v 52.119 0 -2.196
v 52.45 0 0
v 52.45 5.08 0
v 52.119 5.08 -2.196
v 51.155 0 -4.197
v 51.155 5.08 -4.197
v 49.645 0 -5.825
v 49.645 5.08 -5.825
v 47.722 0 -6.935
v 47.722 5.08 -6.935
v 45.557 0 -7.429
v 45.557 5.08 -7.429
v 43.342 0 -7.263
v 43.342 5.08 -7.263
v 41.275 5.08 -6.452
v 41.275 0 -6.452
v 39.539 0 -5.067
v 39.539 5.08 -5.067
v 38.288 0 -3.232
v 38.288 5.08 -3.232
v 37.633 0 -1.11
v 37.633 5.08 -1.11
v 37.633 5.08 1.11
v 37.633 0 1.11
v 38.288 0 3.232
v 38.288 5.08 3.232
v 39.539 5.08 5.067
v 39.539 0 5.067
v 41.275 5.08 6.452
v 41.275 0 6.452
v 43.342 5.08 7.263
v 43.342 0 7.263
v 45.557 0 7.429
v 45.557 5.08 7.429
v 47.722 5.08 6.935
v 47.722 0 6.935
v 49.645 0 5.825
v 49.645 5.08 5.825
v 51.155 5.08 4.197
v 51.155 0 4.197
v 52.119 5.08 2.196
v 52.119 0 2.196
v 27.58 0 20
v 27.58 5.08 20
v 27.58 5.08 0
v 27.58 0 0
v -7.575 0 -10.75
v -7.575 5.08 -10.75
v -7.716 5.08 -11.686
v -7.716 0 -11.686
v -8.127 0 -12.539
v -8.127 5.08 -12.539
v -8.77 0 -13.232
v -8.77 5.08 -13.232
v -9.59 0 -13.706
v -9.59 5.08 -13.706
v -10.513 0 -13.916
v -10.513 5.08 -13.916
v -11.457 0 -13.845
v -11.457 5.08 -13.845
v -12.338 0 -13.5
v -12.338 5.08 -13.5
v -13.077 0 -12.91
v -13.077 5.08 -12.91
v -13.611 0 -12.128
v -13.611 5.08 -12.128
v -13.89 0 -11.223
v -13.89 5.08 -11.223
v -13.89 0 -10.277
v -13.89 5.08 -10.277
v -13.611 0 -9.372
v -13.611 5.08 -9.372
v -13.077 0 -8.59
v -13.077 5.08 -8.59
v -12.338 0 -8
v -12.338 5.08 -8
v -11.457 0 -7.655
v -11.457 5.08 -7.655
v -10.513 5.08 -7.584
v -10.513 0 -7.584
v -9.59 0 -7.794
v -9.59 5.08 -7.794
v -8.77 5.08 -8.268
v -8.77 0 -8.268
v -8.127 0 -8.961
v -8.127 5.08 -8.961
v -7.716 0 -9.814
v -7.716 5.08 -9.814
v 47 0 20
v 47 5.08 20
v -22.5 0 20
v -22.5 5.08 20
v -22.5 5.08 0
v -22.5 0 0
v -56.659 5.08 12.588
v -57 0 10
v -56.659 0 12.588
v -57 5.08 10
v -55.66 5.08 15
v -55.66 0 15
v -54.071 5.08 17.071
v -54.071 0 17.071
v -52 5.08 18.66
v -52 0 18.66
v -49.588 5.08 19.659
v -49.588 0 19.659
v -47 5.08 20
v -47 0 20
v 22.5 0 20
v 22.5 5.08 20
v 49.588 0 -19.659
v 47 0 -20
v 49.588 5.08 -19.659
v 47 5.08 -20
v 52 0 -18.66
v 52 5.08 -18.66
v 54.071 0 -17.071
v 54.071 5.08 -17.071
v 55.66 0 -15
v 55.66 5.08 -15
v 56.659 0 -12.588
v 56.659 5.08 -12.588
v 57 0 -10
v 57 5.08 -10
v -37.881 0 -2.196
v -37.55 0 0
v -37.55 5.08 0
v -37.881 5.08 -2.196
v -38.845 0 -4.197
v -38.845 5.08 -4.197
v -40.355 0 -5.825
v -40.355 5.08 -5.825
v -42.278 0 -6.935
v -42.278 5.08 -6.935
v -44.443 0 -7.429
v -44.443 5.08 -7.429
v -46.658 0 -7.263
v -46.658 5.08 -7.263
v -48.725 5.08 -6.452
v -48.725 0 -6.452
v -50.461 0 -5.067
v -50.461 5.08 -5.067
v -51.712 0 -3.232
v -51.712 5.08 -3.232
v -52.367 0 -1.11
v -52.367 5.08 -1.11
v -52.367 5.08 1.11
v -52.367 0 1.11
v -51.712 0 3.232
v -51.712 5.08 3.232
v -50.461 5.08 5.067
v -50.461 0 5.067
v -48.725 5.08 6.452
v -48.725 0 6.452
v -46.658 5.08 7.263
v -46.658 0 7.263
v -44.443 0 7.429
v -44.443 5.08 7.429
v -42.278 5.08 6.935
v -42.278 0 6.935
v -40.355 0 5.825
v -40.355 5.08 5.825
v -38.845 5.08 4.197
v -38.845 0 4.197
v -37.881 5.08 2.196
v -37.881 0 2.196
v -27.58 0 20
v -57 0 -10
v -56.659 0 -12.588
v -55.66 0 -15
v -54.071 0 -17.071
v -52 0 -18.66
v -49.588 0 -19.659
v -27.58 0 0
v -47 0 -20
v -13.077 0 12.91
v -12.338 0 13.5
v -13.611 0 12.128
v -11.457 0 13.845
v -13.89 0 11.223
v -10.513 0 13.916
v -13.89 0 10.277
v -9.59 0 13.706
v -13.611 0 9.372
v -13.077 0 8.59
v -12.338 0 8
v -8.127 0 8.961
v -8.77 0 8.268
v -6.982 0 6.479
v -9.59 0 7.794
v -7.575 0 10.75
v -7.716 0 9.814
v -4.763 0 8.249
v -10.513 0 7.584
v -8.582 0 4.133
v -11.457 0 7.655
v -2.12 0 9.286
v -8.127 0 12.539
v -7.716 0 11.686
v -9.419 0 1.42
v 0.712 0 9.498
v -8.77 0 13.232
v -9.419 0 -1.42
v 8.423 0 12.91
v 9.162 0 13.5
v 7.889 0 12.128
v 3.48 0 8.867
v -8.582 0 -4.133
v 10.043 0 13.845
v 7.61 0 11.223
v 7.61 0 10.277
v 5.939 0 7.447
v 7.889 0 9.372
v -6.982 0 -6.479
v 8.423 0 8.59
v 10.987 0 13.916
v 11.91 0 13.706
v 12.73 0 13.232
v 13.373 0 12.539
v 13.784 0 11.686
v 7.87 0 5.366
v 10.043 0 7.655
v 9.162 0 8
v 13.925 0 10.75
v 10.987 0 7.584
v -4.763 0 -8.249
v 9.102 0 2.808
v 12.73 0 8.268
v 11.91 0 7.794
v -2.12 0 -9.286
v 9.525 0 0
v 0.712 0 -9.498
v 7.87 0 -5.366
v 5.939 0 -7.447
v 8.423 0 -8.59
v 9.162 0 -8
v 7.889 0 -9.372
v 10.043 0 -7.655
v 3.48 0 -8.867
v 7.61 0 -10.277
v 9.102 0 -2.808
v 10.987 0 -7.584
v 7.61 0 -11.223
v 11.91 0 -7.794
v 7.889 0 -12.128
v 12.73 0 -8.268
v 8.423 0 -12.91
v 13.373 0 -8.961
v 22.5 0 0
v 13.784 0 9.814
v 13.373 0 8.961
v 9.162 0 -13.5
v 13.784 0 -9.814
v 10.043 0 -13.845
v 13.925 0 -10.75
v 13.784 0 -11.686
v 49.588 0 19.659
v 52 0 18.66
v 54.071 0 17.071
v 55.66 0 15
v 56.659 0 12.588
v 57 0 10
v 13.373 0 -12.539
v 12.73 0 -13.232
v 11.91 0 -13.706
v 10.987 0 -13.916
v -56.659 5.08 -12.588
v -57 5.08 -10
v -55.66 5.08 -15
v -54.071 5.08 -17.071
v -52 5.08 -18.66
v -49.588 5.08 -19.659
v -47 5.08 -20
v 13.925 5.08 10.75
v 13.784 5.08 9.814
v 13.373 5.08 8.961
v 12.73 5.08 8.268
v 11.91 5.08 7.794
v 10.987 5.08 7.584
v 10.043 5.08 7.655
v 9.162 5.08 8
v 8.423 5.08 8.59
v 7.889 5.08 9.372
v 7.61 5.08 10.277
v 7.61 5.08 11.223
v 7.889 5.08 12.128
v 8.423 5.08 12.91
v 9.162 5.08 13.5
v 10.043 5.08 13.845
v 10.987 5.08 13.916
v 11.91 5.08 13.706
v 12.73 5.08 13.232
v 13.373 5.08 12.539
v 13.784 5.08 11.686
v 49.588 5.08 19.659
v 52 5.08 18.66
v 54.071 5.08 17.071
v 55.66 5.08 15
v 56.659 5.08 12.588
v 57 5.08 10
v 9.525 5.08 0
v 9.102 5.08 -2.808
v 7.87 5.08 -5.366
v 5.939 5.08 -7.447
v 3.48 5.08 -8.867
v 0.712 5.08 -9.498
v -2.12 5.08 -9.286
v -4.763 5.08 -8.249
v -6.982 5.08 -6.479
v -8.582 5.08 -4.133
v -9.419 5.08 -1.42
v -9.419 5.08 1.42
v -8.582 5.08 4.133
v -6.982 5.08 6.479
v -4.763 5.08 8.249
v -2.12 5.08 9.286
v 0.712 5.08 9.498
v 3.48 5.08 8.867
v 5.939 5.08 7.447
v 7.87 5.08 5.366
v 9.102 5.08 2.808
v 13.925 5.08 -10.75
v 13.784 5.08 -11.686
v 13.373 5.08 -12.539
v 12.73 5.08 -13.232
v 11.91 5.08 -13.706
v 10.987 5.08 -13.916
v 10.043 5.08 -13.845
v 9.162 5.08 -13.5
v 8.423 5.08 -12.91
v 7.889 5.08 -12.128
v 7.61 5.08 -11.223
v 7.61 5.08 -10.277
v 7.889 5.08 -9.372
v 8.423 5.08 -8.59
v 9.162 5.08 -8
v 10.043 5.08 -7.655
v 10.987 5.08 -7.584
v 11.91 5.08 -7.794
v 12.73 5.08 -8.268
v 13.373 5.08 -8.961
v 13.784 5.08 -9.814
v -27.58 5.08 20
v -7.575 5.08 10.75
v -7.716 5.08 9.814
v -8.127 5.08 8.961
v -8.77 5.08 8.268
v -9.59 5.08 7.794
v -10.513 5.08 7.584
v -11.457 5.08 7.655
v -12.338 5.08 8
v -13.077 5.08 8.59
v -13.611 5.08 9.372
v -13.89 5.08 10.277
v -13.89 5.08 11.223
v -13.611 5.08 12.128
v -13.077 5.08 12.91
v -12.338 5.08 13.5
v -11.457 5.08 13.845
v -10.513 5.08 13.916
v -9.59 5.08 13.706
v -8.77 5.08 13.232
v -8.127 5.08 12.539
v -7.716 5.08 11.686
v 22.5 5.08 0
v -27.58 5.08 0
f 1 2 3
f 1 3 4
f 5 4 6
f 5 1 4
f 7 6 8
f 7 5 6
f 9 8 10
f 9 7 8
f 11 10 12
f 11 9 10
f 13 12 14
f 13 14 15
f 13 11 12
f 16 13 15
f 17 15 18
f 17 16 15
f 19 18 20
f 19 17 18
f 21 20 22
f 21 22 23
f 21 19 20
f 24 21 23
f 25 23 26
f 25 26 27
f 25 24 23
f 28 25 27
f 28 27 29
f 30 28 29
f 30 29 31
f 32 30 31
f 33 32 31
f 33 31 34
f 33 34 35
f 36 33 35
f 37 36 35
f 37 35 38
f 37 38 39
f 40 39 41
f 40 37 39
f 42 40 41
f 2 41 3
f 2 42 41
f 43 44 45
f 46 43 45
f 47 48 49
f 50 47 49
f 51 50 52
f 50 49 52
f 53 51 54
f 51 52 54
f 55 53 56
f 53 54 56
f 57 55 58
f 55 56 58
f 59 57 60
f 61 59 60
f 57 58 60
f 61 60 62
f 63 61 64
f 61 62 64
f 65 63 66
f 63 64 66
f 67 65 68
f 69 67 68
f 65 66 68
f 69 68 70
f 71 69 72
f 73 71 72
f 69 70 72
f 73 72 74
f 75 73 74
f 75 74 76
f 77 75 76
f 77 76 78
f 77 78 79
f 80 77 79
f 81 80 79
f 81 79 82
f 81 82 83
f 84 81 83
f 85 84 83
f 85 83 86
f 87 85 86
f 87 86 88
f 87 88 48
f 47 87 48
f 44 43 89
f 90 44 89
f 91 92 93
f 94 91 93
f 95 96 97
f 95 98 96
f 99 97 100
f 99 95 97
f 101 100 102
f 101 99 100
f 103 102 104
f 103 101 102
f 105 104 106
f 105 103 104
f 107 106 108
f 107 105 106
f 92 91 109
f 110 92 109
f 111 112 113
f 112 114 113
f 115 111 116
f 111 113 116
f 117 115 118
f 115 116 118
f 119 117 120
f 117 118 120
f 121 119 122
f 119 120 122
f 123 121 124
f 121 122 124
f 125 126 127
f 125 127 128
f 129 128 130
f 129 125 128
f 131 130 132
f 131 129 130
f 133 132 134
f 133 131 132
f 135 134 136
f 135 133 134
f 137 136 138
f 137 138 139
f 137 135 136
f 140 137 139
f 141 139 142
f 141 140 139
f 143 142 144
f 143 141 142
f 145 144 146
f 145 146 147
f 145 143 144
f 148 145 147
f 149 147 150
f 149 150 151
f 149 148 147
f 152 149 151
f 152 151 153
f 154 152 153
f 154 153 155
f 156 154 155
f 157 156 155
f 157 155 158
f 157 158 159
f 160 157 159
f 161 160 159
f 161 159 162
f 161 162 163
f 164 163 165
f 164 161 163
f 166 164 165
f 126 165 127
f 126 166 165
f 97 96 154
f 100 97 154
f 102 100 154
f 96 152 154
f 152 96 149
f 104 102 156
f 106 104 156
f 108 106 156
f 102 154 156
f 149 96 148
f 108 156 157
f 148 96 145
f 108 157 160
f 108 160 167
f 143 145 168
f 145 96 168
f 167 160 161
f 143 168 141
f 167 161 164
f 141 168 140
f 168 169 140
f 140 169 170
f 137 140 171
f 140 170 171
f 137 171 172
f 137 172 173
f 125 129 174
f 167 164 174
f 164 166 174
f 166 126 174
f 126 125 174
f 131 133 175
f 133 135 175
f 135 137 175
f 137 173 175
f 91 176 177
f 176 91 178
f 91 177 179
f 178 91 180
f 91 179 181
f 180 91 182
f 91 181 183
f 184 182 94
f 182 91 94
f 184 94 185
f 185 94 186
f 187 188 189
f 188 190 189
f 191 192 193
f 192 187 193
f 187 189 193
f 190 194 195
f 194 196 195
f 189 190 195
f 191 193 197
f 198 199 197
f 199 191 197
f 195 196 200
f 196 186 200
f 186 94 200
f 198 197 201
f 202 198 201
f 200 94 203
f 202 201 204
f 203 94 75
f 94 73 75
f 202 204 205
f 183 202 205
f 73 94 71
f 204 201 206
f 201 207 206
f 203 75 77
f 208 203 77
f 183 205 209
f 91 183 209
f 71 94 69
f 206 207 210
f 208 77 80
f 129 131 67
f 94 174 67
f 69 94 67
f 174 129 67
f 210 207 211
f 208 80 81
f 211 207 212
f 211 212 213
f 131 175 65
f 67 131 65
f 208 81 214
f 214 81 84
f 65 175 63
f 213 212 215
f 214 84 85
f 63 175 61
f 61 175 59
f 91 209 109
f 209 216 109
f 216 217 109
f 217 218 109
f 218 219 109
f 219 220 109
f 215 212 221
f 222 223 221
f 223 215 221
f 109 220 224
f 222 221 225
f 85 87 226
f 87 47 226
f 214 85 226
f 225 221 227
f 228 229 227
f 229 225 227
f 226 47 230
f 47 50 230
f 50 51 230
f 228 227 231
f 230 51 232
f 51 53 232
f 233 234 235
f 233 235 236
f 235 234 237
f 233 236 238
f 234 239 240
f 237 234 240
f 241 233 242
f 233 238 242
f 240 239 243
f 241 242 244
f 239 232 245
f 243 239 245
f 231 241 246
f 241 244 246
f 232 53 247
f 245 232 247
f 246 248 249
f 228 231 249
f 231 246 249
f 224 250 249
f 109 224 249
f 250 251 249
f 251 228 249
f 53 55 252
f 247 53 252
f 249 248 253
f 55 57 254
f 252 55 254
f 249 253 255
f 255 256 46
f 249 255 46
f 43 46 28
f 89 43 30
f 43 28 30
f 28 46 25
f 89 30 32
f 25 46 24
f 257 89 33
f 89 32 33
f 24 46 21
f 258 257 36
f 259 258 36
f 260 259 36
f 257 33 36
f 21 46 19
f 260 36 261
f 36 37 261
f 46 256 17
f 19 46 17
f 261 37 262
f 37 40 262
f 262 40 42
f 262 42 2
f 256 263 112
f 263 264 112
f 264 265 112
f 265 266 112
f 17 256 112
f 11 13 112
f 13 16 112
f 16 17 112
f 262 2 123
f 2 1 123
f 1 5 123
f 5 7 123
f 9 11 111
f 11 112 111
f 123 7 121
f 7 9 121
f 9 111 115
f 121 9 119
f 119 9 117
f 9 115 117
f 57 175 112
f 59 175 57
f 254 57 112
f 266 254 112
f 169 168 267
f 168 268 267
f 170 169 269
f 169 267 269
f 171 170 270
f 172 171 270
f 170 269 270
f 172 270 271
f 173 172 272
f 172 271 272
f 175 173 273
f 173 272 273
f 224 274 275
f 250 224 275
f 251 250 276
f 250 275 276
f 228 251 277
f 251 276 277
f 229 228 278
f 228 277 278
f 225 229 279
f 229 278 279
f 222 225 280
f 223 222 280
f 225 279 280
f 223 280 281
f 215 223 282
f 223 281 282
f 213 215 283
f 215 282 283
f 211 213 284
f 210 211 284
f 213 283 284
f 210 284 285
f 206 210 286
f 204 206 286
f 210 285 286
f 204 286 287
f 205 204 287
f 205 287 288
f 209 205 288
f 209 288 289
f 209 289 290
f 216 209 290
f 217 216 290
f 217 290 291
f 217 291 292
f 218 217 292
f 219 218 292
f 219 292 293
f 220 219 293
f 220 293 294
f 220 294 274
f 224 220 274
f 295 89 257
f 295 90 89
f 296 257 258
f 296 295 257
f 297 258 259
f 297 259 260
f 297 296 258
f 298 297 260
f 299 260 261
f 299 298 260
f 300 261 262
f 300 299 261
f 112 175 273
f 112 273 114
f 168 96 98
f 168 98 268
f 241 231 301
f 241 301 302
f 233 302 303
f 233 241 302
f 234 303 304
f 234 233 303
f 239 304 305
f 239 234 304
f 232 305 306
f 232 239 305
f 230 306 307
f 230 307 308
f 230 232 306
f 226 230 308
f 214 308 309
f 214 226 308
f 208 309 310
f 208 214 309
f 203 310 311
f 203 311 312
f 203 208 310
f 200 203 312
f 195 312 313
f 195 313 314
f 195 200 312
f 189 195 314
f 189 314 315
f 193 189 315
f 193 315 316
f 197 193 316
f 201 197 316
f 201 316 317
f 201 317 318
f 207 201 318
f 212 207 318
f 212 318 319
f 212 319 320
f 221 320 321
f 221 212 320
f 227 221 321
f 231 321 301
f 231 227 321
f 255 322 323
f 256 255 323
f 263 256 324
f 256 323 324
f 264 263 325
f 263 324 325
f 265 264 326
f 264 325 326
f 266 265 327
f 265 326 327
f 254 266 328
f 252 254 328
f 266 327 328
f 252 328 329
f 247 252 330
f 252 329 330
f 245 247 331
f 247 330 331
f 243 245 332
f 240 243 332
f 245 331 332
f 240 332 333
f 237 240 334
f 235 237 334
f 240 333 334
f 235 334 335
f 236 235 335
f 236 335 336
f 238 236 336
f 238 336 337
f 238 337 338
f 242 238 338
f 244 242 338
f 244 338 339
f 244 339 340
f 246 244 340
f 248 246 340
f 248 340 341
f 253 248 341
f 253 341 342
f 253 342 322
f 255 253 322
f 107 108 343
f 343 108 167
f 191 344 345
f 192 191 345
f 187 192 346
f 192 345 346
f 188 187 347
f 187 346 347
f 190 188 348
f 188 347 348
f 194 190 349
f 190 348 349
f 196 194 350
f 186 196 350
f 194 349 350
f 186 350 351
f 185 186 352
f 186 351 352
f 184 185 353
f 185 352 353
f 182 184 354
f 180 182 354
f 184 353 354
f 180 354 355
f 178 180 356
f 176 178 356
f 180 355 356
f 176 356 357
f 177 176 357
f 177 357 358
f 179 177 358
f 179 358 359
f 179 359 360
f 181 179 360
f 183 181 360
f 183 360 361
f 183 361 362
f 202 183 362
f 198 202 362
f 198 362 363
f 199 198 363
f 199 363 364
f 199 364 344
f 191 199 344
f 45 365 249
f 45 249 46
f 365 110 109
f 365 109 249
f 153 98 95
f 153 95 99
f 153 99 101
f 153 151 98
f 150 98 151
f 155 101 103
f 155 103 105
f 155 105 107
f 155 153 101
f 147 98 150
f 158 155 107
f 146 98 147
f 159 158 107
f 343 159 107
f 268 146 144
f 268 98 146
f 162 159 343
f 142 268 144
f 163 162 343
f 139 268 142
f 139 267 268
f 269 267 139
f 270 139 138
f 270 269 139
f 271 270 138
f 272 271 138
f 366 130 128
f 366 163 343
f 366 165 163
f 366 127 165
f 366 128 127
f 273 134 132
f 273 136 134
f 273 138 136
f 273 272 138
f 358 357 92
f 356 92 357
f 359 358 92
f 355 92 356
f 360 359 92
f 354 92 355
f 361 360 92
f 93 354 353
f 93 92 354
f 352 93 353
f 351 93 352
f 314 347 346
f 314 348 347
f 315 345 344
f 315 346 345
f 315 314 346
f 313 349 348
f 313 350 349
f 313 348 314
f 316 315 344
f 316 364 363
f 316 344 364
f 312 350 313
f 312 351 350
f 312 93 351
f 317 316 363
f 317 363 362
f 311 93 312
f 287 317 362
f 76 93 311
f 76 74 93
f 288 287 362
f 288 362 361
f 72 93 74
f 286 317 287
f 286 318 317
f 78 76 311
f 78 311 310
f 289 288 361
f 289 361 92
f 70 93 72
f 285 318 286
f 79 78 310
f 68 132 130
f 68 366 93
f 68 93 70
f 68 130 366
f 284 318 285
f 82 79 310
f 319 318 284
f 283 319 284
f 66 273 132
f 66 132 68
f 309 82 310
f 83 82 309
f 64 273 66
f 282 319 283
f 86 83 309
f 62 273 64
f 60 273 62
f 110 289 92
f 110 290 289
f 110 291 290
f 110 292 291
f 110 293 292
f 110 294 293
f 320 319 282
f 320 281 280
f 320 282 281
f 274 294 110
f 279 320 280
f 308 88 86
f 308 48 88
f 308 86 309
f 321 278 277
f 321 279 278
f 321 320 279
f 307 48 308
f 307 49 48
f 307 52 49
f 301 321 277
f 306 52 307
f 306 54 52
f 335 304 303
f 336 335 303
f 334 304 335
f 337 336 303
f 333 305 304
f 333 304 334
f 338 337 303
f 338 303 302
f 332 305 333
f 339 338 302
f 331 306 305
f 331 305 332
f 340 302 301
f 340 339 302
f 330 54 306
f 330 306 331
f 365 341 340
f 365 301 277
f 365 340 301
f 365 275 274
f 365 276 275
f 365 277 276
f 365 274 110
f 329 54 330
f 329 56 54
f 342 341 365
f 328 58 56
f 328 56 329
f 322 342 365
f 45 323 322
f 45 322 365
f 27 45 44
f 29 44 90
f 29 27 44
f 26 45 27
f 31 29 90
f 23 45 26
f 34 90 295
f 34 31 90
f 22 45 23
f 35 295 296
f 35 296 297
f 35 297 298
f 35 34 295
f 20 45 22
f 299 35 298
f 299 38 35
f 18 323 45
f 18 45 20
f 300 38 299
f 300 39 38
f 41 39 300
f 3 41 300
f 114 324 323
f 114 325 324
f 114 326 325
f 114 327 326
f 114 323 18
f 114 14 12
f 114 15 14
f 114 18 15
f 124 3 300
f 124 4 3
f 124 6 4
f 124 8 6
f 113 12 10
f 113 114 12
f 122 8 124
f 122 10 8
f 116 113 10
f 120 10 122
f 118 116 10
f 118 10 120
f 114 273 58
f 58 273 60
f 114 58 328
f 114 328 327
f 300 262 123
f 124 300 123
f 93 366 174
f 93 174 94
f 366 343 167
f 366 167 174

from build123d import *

# Parameters (mm, degrees)
SKETCH1_W           = 114
SKETCH1_H           = 40
SKETCH1_R           = 7.45
SKETCH1_R_2         = 9.525
BOSS_EXTRUDE1_DEPTH = 5.08
FILLET1_R           = 10
SKETCH2_R           = 3.175
SKETCH2_W           = 5.08
SKETCH2_H           = 20
CUT_EXTRUDE1_DEPTH  = 6.08


with BuildPart() as part:
    # Sketch1 → Boss-Extrude1 (new body)
    with BuildSketch(Plane(origin=(0, 0, 0), x_dir=(1, 0, 0), z_dir=(0, 1, 0))):
        Rectangle(SKETCH1_W, SKETCH1_H)
        with Locations((-45, 0)):
            Circle(SKETCH1_R, mode=Mode.SUBTRACT)
        with Locations((45, 0)):
            Circle(SKETCH1_R, mode=Mode.SUBTRACT)
        Circle(SKETCH1_R_2, mode=Mode.SUBTRACT)
    extrude(amount=BOSS_EXTRUDE1_DEPTH)

    # Fillet1
    fillet1_edges = [part.edges().sort_by_distance(p)[0] for p in [
        (-57, 2.54, -20),
        (57, 2.54, -20),
        (57, 2.54, 20),
        (-57, 2.54, 20),
    ]]
    fillet(fillet1_edges, radius=FILLET1_R)

    # Sketch2 → Cut-Extrude1 (cut, through all)
    with BuildSketch(Plane(origin=(0, 5.08, 0), x_dir=(1, 0, 0), z_dir=(0, 1, 0))):
        with Locations((10.75, -10.75)):
            Circle(SKETCH2_R)
        with Locations((-10.75, -10.75)):
            Circle(SKETCH2_R)
        with Locations((-10.75, 10.75)):
            Circle(SKETCH2_R)
        with Locations((10.75, 10.75)):
            Circle(SKETCH2_R)
        with Locations((-25.04, -10)):
            Rectangle(SKETCH2_W, SKETCH2_H)
        with Locations((25.04, -10)):
            Rectangle(SKETCH2_W, SKETCH2_H)
    extrude(amount=-CUT_EXTRUDE1_DEPTH, mode=Mode.SUBTRACT)


solid = part.part
